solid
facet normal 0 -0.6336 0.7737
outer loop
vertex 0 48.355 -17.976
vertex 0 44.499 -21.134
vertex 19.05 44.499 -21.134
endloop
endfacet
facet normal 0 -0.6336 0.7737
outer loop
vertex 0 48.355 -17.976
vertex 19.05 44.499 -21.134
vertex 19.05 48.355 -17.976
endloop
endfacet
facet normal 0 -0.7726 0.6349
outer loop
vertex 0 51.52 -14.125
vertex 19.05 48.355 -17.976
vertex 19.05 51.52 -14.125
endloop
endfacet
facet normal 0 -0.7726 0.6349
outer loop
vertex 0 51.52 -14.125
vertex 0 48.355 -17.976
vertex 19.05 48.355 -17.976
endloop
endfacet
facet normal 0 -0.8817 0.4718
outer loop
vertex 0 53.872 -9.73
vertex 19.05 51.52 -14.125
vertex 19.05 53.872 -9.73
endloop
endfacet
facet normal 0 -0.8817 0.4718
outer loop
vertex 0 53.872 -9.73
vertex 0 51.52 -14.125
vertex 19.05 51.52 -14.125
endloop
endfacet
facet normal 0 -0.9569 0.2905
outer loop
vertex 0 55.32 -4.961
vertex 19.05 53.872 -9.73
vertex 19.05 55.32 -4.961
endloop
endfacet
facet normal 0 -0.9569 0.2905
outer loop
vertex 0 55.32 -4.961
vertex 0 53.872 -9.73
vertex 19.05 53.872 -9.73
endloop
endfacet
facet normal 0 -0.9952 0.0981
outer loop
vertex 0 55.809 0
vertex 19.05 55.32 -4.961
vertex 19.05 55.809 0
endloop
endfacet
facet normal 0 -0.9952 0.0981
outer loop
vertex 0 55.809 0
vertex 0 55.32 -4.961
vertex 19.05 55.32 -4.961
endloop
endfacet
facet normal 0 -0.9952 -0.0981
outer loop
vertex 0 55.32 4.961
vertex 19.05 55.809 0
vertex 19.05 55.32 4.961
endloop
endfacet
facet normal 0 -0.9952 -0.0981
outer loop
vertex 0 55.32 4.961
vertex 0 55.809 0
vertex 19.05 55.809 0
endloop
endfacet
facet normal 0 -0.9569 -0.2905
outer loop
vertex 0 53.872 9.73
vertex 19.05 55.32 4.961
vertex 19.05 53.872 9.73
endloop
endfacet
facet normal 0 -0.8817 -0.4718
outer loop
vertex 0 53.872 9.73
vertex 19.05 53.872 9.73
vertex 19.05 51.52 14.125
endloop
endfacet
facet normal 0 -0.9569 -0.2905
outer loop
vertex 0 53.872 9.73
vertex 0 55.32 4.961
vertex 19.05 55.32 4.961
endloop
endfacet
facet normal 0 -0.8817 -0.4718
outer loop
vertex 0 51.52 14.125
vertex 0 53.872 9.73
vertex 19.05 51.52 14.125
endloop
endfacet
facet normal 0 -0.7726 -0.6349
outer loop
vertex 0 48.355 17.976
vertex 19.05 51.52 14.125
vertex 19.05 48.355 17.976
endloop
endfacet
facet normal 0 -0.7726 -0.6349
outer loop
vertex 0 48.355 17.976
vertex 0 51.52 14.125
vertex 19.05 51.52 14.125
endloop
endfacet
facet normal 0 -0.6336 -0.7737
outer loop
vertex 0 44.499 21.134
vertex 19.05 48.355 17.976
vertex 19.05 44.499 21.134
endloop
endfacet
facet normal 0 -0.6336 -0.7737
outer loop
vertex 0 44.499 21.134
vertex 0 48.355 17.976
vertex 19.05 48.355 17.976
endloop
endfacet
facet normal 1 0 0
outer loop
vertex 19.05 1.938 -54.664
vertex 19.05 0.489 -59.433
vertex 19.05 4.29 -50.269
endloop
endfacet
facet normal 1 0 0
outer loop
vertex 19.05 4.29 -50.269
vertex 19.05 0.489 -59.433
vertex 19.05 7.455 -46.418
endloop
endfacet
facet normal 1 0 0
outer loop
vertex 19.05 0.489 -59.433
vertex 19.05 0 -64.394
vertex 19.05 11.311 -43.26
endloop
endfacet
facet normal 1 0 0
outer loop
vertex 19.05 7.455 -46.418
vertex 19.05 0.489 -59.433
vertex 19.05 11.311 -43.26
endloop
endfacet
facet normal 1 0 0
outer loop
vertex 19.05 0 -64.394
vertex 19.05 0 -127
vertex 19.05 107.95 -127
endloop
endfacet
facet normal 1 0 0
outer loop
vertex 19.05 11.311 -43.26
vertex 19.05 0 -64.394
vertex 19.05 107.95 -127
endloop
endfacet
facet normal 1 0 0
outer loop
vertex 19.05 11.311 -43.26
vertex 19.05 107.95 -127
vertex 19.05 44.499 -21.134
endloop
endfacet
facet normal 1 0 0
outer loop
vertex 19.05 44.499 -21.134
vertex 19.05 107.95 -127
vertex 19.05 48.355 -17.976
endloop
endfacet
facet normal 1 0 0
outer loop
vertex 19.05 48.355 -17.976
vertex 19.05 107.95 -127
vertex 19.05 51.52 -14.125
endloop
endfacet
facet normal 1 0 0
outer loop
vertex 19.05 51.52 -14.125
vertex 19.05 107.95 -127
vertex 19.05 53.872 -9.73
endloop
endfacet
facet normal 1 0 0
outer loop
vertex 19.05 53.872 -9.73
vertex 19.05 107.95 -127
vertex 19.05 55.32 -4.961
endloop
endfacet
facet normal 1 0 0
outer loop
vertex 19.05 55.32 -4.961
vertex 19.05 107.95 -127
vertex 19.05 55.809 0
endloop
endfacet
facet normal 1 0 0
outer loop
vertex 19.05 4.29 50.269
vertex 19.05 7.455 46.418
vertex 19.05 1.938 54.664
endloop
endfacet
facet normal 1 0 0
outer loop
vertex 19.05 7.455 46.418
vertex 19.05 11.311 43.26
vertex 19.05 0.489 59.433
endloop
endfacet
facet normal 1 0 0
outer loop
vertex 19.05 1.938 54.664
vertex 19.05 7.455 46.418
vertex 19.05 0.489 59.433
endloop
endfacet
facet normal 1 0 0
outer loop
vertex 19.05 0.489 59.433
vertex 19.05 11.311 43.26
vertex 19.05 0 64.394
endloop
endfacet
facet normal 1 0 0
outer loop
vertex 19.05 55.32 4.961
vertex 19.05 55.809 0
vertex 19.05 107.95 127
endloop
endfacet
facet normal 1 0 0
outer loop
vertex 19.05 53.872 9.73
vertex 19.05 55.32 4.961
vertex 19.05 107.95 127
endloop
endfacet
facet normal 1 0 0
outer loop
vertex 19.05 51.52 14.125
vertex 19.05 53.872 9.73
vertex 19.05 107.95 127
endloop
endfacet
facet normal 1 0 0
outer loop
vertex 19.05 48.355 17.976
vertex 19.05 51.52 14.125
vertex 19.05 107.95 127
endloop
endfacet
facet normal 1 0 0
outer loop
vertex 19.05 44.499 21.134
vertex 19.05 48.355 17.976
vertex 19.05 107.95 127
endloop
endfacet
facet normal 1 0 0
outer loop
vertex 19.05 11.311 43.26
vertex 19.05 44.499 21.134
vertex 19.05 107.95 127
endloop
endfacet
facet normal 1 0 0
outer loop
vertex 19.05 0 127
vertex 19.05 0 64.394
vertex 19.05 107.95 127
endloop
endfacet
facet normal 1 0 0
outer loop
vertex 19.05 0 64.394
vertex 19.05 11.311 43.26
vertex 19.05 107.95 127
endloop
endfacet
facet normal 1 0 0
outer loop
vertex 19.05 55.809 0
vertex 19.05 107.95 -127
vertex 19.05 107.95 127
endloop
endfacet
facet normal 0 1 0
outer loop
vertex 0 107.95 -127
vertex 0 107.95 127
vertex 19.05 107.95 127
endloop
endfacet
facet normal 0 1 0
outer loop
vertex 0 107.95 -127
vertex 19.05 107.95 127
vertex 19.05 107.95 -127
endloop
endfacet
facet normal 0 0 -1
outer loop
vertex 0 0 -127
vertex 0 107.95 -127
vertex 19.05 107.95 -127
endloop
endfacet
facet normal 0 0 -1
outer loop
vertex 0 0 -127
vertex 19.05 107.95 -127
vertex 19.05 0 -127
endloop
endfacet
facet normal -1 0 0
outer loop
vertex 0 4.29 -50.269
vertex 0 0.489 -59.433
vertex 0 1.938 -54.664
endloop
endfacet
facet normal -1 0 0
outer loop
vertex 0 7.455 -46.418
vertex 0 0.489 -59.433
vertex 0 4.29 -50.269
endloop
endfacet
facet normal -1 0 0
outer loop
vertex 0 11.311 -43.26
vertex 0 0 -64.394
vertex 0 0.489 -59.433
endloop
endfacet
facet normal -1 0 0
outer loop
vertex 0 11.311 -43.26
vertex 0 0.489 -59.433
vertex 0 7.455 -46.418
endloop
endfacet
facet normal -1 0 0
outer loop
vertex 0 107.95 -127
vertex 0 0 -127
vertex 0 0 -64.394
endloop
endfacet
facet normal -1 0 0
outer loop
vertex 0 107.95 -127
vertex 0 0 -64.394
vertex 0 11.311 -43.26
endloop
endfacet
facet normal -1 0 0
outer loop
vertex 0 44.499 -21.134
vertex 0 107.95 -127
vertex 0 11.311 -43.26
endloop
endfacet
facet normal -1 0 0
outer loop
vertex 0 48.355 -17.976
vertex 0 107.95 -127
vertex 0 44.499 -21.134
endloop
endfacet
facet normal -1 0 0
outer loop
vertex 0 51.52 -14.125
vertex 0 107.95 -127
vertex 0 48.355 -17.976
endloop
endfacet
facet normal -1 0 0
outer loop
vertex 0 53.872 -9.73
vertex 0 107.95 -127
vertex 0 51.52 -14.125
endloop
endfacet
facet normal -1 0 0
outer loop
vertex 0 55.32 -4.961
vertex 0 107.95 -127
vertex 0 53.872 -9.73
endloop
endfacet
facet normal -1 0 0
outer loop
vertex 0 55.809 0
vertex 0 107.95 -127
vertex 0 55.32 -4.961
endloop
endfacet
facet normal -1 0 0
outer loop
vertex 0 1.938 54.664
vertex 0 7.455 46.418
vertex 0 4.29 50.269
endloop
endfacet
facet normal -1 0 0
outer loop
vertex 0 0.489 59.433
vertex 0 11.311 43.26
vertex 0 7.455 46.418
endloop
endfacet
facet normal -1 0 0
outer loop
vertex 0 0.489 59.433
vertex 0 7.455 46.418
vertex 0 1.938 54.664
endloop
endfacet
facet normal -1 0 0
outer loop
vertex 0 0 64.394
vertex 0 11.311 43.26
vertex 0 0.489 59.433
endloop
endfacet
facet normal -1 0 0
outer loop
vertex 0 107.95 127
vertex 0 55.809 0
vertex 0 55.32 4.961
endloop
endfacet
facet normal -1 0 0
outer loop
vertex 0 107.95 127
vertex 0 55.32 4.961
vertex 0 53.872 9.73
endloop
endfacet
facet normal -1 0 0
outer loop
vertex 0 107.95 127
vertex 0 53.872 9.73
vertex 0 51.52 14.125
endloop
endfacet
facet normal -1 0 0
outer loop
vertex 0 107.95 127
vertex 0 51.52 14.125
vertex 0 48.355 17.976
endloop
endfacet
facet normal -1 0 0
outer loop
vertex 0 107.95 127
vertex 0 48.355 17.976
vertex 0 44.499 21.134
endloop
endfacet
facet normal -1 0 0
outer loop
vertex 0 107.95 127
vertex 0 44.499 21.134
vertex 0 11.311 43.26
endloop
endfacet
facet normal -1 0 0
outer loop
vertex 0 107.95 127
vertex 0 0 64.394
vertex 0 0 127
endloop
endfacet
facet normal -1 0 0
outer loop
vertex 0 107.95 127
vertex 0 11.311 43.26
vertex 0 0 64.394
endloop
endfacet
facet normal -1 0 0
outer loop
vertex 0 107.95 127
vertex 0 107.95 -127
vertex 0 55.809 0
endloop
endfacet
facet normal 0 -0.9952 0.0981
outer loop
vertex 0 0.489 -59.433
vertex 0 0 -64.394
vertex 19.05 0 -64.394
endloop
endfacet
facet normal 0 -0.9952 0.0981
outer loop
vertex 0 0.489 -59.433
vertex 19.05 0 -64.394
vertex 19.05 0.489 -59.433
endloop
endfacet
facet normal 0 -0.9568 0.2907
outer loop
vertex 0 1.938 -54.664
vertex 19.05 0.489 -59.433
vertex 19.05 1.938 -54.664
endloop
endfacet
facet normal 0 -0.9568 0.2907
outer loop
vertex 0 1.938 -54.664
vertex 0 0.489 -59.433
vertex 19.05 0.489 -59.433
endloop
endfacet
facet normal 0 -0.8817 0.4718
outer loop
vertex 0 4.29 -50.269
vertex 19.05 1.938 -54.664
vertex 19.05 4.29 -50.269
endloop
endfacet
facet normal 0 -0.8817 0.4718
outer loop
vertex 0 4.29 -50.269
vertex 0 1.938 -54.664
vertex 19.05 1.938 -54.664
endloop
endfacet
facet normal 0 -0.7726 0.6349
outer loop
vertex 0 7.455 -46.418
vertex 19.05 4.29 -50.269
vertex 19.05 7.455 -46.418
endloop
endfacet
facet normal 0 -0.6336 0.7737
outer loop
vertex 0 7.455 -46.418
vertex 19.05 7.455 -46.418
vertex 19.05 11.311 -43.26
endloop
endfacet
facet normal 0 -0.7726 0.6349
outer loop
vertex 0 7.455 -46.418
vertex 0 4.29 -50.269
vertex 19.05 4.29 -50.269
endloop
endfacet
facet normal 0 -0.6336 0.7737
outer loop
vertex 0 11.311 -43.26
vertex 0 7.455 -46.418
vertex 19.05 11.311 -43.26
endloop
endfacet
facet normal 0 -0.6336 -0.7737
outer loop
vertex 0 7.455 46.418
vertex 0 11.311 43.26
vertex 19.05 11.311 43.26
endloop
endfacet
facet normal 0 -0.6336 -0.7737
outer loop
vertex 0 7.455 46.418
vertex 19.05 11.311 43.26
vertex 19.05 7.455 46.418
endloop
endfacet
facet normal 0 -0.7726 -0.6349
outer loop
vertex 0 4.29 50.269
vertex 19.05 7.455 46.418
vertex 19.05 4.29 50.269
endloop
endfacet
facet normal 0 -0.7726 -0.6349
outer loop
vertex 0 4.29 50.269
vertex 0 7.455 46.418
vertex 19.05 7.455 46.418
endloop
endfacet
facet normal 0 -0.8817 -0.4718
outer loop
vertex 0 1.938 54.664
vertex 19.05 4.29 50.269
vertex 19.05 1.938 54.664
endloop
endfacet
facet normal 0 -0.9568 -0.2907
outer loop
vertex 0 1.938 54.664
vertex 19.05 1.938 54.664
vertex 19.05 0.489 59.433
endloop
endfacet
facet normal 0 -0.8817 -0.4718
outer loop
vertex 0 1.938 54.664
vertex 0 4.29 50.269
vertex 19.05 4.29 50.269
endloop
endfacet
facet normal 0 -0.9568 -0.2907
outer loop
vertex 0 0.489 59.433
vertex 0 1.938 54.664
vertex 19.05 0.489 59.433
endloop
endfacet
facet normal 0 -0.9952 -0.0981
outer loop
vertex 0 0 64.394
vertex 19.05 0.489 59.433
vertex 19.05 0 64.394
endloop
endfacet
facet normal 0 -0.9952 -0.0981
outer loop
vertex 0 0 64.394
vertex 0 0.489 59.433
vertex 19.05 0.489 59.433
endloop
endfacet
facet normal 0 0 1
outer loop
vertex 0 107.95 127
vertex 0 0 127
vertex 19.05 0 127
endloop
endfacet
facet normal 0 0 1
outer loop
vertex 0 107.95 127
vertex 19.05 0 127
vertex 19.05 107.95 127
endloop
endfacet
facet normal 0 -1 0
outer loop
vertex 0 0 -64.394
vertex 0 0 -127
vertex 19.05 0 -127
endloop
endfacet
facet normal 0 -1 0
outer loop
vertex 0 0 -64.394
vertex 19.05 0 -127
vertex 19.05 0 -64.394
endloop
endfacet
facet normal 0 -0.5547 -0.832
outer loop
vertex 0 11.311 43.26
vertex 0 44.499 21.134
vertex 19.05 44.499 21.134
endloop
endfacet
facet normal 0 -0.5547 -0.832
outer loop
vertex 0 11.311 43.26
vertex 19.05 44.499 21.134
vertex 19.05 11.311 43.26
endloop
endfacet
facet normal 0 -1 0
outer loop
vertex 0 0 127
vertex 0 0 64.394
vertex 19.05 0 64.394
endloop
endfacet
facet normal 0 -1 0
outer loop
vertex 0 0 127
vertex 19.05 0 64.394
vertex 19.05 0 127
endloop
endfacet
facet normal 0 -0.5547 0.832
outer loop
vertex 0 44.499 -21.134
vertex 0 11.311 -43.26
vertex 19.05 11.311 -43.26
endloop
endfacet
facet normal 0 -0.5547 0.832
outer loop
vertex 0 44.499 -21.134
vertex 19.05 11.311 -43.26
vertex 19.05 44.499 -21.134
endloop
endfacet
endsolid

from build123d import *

# Parameters (mm, degrees)
BOSS_EXTRUDE1_DEPTH = 19.05


with BuildPart() as part:
    # Sketch1 → Boss-Extrude1 (new body)
    with BuildSketch(Plane(origin=(0, 0, 0), x_dir=(0, 0, -1), z_dir=(1, 0, 0))):
        with BuildLine():
            Line((-127, 0), (-127, 107.95))
            Line((-127, 107.95), (127, 107.95))
            Line((127, 107.95), (127, 0))
            Line((127, 0), (64.393667466, 0))
            ThreePointArc((64.393667466, 0), (52.408476157, 3.005465191), (43.259589989, 11.310615016))
            Line((43.259589989, 11.310615016), (21.134077476, 44.498883786))
            ThreePointArc((21.134077476, 44.498883786), (0, 55.809498802), (-21.134077476, 44.498883786))
            Line((-21.134077476, 44.498883786), (-43.259589989, 11.310615016))
            ThreePointArc((-43.259589989, 11.310615016), (-52.408476157, 3.005465191), (-64.393667466, 0))
            Line((-64.393667466, 0), (-127, 0))
        make_face()
    extrude(amount=BOSS_EXTRUDE1_DEPTH)


solid = part.part
